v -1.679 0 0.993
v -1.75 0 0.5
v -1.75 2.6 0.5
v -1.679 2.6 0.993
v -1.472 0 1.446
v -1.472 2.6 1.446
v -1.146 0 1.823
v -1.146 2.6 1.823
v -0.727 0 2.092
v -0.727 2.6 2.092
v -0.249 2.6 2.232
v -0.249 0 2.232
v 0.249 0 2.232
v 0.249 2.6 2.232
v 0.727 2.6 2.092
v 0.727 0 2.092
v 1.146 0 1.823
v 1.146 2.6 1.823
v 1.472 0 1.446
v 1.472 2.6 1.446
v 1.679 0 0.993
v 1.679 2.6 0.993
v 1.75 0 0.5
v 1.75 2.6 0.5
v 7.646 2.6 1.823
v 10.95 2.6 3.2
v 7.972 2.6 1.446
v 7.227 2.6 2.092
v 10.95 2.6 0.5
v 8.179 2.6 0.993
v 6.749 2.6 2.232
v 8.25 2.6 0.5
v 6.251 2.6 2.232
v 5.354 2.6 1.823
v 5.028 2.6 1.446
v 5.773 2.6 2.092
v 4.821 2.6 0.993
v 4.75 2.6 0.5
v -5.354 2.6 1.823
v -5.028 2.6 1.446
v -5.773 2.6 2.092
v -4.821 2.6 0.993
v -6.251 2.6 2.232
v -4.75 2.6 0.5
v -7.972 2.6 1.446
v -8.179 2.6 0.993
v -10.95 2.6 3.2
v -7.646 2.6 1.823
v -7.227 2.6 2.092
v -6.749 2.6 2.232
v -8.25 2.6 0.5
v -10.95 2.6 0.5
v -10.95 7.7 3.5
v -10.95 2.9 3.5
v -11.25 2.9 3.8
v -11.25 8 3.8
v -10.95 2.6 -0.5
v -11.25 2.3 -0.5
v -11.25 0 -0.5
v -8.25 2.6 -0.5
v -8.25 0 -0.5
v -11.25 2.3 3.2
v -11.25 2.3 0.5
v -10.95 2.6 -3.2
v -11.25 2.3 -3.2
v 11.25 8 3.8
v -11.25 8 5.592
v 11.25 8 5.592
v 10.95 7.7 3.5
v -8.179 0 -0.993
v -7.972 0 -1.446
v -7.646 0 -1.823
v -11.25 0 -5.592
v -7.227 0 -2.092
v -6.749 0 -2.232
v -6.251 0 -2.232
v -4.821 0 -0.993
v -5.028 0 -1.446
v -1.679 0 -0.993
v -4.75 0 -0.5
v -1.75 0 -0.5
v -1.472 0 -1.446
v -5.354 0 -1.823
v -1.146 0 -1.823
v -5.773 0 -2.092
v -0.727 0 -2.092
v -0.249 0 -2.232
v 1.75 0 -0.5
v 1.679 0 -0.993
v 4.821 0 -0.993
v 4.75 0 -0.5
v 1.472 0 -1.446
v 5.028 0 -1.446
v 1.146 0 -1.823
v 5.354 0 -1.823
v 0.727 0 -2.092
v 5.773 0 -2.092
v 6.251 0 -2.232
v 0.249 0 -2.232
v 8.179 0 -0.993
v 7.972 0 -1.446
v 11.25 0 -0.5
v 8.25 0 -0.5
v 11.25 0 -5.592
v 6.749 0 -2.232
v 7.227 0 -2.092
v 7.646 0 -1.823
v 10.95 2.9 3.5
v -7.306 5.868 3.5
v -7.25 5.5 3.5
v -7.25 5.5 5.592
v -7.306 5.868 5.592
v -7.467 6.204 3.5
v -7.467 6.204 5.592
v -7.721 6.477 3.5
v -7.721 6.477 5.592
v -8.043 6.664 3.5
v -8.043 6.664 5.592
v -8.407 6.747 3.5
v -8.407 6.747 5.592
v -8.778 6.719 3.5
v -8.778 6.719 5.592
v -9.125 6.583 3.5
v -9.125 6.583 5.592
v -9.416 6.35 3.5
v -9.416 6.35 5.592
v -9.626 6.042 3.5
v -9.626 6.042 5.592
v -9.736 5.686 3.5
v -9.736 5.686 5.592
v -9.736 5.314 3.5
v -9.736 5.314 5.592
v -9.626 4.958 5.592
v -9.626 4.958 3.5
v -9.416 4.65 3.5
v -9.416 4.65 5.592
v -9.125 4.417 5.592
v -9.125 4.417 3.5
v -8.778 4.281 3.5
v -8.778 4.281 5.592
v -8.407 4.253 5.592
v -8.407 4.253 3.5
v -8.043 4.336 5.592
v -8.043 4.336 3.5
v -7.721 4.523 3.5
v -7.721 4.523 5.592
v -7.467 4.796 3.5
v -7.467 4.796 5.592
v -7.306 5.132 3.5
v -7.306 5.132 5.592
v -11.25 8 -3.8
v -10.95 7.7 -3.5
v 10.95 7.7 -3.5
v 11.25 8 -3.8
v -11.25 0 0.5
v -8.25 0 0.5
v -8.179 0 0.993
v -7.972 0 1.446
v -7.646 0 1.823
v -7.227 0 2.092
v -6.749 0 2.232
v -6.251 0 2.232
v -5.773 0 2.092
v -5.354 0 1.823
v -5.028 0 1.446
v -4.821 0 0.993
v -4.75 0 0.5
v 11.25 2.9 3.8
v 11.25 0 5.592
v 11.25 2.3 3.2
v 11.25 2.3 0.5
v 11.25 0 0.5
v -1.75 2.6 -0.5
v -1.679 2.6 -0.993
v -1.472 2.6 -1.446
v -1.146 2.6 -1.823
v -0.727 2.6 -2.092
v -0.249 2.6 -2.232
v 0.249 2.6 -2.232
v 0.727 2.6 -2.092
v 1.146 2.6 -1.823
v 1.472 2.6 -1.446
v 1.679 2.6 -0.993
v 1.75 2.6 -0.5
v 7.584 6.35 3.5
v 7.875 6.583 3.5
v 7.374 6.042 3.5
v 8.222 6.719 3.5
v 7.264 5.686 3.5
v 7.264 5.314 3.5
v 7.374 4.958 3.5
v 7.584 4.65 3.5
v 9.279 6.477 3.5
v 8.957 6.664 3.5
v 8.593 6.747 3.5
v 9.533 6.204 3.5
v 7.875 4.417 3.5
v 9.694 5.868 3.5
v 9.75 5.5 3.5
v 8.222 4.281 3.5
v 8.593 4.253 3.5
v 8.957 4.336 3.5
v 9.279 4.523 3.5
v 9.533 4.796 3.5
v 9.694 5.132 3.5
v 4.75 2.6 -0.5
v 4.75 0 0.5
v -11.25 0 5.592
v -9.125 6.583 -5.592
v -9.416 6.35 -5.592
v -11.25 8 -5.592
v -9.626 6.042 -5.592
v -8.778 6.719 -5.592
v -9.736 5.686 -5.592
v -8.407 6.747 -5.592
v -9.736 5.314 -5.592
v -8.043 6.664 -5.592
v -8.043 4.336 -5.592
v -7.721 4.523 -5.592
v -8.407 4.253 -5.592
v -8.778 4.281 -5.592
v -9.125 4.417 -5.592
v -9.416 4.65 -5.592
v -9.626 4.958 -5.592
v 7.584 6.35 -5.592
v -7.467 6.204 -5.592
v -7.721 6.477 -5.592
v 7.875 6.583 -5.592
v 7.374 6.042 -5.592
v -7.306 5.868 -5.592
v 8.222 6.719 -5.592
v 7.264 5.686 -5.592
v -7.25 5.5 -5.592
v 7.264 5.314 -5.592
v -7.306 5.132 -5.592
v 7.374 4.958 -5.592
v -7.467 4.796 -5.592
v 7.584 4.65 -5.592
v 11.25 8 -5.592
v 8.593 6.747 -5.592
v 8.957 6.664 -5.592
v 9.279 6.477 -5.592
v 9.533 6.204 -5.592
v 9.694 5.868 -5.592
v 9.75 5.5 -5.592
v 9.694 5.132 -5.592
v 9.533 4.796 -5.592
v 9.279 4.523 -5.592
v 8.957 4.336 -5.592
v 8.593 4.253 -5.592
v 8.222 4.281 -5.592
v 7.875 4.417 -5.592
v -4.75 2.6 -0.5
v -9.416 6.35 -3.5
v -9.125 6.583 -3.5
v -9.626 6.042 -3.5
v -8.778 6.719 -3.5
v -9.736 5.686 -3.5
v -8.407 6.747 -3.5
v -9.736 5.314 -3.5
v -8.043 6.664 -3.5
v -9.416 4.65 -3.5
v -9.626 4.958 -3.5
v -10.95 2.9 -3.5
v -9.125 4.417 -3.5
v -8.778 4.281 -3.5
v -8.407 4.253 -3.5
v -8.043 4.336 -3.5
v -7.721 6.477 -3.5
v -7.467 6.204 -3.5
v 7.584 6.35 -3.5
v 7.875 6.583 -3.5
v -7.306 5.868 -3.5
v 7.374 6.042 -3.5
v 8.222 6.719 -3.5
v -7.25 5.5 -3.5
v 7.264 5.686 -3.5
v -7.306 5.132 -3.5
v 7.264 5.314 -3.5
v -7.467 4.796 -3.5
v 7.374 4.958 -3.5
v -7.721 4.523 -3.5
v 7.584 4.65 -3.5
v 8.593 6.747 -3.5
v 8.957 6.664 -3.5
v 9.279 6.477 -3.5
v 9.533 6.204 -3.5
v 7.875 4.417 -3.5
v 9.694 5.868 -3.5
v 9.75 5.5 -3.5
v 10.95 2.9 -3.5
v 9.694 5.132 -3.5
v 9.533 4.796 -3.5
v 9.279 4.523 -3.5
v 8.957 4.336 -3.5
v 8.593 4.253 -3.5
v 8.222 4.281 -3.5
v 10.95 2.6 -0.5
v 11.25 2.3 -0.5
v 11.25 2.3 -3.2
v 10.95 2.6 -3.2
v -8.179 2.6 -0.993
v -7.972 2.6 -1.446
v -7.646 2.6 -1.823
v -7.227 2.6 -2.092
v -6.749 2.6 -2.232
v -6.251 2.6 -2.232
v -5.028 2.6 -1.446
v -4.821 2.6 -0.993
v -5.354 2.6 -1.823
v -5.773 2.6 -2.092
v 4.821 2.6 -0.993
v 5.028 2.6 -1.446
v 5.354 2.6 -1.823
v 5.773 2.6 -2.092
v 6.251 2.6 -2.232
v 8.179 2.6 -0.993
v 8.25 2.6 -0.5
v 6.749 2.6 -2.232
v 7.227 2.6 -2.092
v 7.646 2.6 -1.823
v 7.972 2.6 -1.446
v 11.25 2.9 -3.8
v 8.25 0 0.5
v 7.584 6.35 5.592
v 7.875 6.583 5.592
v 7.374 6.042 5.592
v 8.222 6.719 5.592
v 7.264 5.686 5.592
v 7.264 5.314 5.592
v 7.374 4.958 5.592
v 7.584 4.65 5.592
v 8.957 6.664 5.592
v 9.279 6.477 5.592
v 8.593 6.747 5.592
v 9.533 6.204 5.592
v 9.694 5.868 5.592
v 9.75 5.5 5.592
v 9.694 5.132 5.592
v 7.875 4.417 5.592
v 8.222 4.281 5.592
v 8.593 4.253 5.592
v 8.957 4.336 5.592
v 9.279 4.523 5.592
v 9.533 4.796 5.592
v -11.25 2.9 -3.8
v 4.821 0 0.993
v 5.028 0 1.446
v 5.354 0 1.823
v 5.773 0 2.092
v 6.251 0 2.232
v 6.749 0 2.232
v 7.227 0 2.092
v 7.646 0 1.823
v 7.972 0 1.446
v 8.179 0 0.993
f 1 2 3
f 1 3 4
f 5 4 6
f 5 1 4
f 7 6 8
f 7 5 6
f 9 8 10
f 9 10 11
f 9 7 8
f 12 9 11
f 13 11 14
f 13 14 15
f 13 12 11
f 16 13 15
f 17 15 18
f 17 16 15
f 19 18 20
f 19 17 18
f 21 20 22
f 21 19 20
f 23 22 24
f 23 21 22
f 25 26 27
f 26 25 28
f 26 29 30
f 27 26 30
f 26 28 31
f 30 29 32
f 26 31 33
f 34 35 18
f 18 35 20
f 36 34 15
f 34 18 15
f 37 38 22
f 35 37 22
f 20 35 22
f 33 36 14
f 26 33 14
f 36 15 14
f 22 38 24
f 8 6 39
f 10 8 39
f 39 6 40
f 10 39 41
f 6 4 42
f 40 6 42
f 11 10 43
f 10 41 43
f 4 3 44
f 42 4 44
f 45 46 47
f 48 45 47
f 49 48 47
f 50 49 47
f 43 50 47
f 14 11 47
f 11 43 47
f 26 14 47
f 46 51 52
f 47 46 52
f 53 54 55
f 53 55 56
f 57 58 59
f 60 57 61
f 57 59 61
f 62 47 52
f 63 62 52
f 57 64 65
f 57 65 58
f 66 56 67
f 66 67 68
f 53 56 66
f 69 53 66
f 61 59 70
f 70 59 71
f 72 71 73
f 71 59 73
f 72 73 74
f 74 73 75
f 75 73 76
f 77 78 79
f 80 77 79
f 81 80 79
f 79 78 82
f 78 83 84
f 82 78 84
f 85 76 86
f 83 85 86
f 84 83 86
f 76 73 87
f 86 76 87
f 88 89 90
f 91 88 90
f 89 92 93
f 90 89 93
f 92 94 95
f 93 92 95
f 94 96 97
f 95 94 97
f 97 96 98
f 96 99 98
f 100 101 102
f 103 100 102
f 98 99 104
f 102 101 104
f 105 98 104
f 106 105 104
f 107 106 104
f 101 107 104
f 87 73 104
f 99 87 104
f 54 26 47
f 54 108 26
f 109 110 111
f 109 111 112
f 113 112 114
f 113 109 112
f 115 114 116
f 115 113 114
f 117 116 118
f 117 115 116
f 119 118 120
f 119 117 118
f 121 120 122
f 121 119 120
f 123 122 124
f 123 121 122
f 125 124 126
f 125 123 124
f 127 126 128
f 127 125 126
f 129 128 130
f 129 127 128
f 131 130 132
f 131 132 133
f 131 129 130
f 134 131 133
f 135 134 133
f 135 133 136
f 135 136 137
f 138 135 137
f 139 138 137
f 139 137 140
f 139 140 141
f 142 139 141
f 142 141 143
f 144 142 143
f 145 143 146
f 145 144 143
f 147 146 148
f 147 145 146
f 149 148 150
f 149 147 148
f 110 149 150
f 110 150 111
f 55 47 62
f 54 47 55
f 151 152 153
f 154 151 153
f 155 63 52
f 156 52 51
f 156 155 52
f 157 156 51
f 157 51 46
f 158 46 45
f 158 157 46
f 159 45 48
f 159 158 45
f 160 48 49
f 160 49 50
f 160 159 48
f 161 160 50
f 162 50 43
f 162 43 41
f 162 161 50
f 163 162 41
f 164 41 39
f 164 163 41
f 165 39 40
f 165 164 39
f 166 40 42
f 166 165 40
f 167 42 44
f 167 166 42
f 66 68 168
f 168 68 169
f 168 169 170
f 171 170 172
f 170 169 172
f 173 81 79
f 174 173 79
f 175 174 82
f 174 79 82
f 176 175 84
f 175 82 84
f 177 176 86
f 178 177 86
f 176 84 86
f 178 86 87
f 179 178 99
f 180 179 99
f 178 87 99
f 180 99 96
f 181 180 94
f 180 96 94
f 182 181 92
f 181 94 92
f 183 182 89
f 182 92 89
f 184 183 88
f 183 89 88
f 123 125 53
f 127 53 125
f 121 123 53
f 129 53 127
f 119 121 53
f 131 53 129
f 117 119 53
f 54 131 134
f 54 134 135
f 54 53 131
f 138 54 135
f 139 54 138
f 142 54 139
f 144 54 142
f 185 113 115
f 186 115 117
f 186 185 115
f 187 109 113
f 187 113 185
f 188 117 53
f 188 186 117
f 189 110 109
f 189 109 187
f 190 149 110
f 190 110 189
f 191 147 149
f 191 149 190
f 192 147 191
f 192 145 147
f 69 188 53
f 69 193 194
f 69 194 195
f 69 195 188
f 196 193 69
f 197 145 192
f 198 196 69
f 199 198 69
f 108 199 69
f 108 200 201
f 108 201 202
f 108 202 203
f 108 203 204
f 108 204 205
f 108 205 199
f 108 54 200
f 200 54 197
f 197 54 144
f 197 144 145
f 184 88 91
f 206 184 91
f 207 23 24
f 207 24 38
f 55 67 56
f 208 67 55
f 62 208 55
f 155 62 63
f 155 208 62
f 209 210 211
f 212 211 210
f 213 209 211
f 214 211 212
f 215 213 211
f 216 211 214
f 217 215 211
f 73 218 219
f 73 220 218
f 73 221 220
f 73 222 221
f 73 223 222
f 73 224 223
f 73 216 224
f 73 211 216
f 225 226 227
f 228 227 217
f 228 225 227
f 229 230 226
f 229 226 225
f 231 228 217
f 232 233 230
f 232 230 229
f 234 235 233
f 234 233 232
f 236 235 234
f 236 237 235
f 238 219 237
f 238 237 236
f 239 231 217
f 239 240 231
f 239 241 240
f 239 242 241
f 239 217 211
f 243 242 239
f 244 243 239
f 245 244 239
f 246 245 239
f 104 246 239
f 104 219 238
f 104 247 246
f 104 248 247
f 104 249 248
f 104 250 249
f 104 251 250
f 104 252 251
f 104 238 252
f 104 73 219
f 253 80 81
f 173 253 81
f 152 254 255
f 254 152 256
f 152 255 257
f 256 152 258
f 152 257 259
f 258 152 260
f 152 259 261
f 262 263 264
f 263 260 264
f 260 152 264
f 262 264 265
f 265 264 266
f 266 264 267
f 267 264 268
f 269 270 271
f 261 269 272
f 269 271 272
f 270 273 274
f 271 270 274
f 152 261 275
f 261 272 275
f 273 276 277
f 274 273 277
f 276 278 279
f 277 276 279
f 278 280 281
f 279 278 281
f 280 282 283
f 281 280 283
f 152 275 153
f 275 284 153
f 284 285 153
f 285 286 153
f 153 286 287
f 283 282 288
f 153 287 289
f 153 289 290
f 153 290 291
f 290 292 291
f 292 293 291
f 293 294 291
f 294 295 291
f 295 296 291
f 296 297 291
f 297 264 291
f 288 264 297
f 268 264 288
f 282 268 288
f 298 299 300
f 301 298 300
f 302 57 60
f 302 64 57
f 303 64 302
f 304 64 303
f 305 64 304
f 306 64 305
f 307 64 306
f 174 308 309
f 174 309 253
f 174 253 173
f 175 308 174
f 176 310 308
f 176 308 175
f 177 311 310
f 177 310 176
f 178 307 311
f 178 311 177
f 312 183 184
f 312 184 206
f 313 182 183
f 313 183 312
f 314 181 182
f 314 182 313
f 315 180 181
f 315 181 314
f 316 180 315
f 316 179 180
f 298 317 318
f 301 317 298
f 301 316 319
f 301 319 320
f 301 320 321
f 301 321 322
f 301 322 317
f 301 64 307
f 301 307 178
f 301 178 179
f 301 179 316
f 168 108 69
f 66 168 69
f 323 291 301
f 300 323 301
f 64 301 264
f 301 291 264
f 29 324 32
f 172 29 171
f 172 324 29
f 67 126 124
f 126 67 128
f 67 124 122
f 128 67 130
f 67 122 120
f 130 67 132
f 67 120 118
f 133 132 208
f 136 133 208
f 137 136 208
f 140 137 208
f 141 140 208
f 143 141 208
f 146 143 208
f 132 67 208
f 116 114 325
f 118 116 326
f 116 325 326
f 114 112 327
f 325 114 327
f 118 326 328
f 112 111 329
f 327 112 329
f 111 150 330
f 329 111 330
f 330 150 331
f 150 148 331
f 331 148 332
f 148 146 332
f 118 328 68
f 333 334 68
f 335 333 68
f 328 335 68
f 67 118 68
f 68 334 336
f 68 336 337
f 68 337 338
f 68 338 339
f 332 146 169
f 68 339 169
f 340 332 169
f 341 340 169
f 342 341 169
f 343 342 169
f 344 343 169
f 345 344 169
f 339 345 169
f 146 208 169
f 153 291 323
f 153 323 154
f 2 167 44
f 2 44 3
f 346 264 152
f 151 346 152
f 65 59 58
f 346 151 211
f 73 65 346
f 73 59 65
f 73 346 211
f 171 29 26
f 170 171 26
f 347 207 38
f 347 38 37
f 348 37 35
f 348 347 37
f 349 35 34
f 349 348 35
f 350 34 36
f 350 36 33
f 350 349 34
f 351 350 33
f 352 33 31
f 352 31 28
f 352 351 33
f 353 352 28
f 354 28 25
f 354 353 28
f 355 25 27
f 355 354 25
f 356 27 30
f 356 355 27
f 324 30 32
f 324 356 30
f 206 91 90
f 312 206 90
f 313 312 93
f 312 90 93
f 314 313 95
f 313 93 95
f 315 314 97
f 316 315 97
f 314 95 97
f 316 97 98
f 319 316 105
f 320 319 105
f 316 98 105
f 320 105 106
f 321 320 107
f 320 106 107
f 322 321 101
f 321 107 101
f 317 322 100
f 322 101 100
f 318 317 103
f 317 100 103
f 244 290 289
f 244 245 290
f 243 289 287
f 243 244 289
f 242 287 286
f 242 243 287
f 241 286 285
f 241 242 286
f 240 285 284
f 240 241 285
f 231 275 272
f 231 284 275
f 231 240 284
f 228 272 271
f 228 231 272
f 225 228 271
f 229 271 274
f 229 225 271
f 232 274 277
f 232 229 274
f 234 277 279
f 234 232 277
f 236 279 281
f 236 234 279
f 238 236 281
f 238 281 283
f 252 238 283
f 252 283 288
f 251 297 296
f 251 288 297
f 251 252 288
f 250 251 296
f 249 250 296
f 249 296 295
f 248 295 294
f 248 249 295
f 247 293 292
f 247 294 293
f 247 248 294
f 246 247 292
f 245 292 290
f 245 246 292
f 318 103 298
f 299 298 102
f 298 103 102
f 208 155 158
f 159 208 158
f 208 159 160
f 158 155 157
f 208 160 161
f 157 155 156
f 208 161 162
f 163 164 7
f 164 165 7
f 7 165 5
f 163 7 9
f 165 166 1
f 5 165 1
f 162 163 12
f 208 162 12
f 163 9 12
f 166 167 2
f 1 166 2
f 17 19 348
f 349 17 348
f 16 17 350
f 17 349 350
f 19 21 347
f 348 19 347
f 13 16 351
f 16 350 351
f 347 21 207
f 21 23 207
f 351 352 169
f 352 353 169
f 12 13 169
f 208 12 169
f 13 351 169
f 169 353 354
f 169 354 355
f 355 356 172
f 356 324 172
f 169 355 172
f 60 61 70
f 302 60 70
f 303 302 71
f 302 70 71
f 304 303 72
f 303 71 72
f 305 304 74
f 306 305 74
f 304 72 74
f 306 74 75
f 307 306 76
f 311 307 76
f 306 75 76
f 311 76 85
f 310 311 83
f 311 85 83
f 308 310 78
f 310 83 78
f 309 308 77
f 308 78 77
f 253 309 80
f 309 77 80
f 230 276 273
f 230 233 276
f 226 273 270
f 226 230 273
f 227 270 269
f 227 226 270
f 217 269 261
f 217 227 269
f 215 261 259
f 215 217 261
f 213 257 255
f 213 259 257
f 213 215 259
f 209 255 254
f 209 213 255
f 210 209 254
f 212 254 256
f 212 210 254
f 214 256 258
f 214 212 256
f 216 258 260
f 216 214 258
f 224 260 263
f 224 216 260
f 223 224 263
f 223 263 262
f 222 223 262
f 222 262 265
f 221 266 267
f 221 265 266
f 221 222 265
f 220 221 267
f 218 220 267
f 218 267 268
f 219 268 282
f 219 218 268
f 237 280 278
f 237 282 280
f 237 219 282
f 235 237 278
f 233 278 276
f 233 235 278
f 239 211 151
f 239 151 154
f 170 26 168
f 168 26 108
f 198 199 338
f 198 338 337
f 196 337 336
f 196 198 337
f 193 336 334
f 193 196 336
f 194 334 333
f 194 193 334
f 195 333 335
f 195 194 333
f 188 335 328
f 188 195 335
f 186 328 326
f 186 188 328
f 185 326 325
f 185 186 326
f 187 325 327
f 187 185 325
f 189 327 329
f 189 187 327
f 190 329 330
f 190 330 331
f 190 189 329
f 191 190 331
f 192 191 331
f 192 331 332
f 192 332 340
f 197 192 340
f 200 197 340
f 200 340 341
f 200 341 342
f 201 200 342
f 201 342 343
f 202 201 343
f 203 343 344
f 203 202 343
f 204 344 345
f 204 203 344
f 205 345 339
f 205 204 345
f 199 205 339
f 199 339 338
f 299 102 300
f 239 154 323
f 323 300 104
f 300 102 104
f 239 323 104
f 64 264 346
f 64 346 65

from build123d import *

# Parameters (mm, degrees)
SALIENTE_EXTRUIR1_DEPTH   = 2.6
SALIENTE_EXTRUIR1_2_DEPTH = 2.6
CROQUIS2_W                = 22.5
CROQUIS2_H                = 2.092363452
SALIENTE_EXTRUIR2_DEPTH   = 8
CHAFL_N1_SIZE             = 0.3
CHAFL_N2_SIZE             = 0.3
CORTAR_EXTRUIR2_START     = 7
CORTAR_EXTRUIR2_OUTLINE_R = 1.25
CORTAR_EXTRUIR2_DEPTH     = 2.092363452
CORTAR_EXTRUIR3_START     = -15
CROQUIS5_R                = 1.25
CORTAR_EXTRUIR3_DEPTH     = 15


# Read off the part's stored shape, not the designer's step: Cortar-Extruir2
with BuildPart() as part:
    # Croquis1 → Saliente-Extruir1 (new body)
    with BuildSketch(Plane(origin=(0, 0, 0), x_dir=(1, 0, 0), z_dir=(0, 1, 0))):
        with BuildLine():
            Line((-11.25, 3.5), (-11.25, 0.5))
            Line((-11.25, 0.5), (-8.25, 0.5))
            ThreePointArc((-8.25, 0.5), (-6.5, 2.25), (-4.75, 0.5))
            Line((-4.75, 0.5), (-1.75, 0.5))
            ThreePointArc((-1.75, 0.5), (0, 2.25), (1.75, 0.5))
            Line((1.75, 0.5), (4.75, 0.5))
            ThreePointArc((4.75, 0.5), (6.5, 2.25), (8.25, 0.5))
            Line((8.25, 0.5), (11.25, 0.5))
            Line((11.25, 0.5), (11.25, 3.5))
            Line((11.25, 3.5), (-11.25, 3.5))
        make_face()
    extrude(amount=SALIENTE_EXTRUIR1_DEPTH)



with BuildPart() as body_2:
    # Croquis1 → Saliente-Extruir1 2 (new body)
    with BuildSketch(Plane(origin=(0, 0, 0), x_dir=(1, 0, 0), z_dir=(0, 1, 0))):
        with BuildLine():
            Line((-11.25, -3.5), (-11.25, -0.5))
            Line((-11.25, -0.5), (-8.25, -0.5))
            ThreePointArc((-8.25, -0.5), (-6.5, -2.25), (-4.75, -0.5))
            Line((-4.75, -0.5), (-1.75, -0.5))
            ThreePointArc((-1.75, -0.5), (0, -2.25), (1.75, -0.5))
            Line((1.75, -0.5), (4.75, -0.5))
            ThreePointArc((4.75, -0.5), (6.5, -2.25), (8.25, -0.5))
            Line((8.25, -0.5), (11.25, -0.5))
            Line((11.25, -0.5), (11.25, -3.5))
            Line((11.25, -3.5), (-11.25, -3.5))
        make_face()
    extrude(amount=SALIENTE_EXTRUIR1_2_DEPTH)


with BuildPart() as part_1:
    add(part.part)

    add(body_2.part)  # Saliente-Extruir2 merges body 2
    # Croquis2 → Saliente-Extruir2 (add)
    with BuildSketch(Plane(origin=(0, 0, 0), x_dir=(1, 0, 0), z_dir=(0, 1, 0))):
        with Locations((0, 4.546181726)):
            Rectangle(CROQUIS2_W, CROQUIS2_H)
        with Locations((0, -4.546181726)):
            Rectangle(CROQUIS2_W, CROQUIS2_H)
    extrude(amount=SALIENTE_EXTRUIR2_DEPTH)

    # Chaflán1
    chafl_n1_edges = [part_1.edges().sort_by_distance(p)[0] for p in [
        (11.25, 2.6, -2),
        (0, 2.6, -3.5),
        (-11.25, 5.3, -3.5),
        (11.25, 5.3, -3.5),
        (0, 8, -3.5),
        (-11.25, 2.6, -2),
    ]]
    chamfer(chafl_n1_edges, length=CHAFL_N1_SIZE)

    # Chaflán2
    chafl_n2_edges = [part_1.edges().sort_by_distance(p)[0] for p in [
        (-11.25, 2.6, 2),
        (11.25, 5.3, 3.5),
        (-11.25, 5.3, 3.5),
        (0, 8, 3.5),
        (0, 2.6, 3.5),
        (11.25, 2.6, 2),
    ]]
    chamfer(chafl_n2_edges, length=CHAFL_N2_SIZE)

    # Cortar-Extruir2 outline → Cortar-Extruir2 (cut)
    with BuildSketch(Plane.XY.offset(-3.5).offset(CORTAR_EXTRUIR2_START)):
        with Locations((8.5, 5.5)):
            Circle(CORTAR_EXTRUIR2_OUTLINE_R)
        with Locations((-8.5, 5.5)):
            Circle(CORTAR_EXTRUIR2_OUTLINE_R)
    extrude(amount=CORTAR_EXTRUIR2_DEPTH, mode=Mode.SUBTRACT)

    # Croquis5 → Cortar-Extruir3 (cut)
    with BuildSketch(Plane.XY.offset(5.592363452).offset(CORTAR_EXTRUIR3_START)):
        with Locations((-8.5, 5.5)):
            Circle(CROQUIS5_R)
        with Locations((8.5, 5.5)):
            Circle(CROQUIS5_R)
    extrude(amount=CORTAR_EXTRUIR3_DEPTH, mode=Mode.SUBTRACT)


solid = part_1.part
